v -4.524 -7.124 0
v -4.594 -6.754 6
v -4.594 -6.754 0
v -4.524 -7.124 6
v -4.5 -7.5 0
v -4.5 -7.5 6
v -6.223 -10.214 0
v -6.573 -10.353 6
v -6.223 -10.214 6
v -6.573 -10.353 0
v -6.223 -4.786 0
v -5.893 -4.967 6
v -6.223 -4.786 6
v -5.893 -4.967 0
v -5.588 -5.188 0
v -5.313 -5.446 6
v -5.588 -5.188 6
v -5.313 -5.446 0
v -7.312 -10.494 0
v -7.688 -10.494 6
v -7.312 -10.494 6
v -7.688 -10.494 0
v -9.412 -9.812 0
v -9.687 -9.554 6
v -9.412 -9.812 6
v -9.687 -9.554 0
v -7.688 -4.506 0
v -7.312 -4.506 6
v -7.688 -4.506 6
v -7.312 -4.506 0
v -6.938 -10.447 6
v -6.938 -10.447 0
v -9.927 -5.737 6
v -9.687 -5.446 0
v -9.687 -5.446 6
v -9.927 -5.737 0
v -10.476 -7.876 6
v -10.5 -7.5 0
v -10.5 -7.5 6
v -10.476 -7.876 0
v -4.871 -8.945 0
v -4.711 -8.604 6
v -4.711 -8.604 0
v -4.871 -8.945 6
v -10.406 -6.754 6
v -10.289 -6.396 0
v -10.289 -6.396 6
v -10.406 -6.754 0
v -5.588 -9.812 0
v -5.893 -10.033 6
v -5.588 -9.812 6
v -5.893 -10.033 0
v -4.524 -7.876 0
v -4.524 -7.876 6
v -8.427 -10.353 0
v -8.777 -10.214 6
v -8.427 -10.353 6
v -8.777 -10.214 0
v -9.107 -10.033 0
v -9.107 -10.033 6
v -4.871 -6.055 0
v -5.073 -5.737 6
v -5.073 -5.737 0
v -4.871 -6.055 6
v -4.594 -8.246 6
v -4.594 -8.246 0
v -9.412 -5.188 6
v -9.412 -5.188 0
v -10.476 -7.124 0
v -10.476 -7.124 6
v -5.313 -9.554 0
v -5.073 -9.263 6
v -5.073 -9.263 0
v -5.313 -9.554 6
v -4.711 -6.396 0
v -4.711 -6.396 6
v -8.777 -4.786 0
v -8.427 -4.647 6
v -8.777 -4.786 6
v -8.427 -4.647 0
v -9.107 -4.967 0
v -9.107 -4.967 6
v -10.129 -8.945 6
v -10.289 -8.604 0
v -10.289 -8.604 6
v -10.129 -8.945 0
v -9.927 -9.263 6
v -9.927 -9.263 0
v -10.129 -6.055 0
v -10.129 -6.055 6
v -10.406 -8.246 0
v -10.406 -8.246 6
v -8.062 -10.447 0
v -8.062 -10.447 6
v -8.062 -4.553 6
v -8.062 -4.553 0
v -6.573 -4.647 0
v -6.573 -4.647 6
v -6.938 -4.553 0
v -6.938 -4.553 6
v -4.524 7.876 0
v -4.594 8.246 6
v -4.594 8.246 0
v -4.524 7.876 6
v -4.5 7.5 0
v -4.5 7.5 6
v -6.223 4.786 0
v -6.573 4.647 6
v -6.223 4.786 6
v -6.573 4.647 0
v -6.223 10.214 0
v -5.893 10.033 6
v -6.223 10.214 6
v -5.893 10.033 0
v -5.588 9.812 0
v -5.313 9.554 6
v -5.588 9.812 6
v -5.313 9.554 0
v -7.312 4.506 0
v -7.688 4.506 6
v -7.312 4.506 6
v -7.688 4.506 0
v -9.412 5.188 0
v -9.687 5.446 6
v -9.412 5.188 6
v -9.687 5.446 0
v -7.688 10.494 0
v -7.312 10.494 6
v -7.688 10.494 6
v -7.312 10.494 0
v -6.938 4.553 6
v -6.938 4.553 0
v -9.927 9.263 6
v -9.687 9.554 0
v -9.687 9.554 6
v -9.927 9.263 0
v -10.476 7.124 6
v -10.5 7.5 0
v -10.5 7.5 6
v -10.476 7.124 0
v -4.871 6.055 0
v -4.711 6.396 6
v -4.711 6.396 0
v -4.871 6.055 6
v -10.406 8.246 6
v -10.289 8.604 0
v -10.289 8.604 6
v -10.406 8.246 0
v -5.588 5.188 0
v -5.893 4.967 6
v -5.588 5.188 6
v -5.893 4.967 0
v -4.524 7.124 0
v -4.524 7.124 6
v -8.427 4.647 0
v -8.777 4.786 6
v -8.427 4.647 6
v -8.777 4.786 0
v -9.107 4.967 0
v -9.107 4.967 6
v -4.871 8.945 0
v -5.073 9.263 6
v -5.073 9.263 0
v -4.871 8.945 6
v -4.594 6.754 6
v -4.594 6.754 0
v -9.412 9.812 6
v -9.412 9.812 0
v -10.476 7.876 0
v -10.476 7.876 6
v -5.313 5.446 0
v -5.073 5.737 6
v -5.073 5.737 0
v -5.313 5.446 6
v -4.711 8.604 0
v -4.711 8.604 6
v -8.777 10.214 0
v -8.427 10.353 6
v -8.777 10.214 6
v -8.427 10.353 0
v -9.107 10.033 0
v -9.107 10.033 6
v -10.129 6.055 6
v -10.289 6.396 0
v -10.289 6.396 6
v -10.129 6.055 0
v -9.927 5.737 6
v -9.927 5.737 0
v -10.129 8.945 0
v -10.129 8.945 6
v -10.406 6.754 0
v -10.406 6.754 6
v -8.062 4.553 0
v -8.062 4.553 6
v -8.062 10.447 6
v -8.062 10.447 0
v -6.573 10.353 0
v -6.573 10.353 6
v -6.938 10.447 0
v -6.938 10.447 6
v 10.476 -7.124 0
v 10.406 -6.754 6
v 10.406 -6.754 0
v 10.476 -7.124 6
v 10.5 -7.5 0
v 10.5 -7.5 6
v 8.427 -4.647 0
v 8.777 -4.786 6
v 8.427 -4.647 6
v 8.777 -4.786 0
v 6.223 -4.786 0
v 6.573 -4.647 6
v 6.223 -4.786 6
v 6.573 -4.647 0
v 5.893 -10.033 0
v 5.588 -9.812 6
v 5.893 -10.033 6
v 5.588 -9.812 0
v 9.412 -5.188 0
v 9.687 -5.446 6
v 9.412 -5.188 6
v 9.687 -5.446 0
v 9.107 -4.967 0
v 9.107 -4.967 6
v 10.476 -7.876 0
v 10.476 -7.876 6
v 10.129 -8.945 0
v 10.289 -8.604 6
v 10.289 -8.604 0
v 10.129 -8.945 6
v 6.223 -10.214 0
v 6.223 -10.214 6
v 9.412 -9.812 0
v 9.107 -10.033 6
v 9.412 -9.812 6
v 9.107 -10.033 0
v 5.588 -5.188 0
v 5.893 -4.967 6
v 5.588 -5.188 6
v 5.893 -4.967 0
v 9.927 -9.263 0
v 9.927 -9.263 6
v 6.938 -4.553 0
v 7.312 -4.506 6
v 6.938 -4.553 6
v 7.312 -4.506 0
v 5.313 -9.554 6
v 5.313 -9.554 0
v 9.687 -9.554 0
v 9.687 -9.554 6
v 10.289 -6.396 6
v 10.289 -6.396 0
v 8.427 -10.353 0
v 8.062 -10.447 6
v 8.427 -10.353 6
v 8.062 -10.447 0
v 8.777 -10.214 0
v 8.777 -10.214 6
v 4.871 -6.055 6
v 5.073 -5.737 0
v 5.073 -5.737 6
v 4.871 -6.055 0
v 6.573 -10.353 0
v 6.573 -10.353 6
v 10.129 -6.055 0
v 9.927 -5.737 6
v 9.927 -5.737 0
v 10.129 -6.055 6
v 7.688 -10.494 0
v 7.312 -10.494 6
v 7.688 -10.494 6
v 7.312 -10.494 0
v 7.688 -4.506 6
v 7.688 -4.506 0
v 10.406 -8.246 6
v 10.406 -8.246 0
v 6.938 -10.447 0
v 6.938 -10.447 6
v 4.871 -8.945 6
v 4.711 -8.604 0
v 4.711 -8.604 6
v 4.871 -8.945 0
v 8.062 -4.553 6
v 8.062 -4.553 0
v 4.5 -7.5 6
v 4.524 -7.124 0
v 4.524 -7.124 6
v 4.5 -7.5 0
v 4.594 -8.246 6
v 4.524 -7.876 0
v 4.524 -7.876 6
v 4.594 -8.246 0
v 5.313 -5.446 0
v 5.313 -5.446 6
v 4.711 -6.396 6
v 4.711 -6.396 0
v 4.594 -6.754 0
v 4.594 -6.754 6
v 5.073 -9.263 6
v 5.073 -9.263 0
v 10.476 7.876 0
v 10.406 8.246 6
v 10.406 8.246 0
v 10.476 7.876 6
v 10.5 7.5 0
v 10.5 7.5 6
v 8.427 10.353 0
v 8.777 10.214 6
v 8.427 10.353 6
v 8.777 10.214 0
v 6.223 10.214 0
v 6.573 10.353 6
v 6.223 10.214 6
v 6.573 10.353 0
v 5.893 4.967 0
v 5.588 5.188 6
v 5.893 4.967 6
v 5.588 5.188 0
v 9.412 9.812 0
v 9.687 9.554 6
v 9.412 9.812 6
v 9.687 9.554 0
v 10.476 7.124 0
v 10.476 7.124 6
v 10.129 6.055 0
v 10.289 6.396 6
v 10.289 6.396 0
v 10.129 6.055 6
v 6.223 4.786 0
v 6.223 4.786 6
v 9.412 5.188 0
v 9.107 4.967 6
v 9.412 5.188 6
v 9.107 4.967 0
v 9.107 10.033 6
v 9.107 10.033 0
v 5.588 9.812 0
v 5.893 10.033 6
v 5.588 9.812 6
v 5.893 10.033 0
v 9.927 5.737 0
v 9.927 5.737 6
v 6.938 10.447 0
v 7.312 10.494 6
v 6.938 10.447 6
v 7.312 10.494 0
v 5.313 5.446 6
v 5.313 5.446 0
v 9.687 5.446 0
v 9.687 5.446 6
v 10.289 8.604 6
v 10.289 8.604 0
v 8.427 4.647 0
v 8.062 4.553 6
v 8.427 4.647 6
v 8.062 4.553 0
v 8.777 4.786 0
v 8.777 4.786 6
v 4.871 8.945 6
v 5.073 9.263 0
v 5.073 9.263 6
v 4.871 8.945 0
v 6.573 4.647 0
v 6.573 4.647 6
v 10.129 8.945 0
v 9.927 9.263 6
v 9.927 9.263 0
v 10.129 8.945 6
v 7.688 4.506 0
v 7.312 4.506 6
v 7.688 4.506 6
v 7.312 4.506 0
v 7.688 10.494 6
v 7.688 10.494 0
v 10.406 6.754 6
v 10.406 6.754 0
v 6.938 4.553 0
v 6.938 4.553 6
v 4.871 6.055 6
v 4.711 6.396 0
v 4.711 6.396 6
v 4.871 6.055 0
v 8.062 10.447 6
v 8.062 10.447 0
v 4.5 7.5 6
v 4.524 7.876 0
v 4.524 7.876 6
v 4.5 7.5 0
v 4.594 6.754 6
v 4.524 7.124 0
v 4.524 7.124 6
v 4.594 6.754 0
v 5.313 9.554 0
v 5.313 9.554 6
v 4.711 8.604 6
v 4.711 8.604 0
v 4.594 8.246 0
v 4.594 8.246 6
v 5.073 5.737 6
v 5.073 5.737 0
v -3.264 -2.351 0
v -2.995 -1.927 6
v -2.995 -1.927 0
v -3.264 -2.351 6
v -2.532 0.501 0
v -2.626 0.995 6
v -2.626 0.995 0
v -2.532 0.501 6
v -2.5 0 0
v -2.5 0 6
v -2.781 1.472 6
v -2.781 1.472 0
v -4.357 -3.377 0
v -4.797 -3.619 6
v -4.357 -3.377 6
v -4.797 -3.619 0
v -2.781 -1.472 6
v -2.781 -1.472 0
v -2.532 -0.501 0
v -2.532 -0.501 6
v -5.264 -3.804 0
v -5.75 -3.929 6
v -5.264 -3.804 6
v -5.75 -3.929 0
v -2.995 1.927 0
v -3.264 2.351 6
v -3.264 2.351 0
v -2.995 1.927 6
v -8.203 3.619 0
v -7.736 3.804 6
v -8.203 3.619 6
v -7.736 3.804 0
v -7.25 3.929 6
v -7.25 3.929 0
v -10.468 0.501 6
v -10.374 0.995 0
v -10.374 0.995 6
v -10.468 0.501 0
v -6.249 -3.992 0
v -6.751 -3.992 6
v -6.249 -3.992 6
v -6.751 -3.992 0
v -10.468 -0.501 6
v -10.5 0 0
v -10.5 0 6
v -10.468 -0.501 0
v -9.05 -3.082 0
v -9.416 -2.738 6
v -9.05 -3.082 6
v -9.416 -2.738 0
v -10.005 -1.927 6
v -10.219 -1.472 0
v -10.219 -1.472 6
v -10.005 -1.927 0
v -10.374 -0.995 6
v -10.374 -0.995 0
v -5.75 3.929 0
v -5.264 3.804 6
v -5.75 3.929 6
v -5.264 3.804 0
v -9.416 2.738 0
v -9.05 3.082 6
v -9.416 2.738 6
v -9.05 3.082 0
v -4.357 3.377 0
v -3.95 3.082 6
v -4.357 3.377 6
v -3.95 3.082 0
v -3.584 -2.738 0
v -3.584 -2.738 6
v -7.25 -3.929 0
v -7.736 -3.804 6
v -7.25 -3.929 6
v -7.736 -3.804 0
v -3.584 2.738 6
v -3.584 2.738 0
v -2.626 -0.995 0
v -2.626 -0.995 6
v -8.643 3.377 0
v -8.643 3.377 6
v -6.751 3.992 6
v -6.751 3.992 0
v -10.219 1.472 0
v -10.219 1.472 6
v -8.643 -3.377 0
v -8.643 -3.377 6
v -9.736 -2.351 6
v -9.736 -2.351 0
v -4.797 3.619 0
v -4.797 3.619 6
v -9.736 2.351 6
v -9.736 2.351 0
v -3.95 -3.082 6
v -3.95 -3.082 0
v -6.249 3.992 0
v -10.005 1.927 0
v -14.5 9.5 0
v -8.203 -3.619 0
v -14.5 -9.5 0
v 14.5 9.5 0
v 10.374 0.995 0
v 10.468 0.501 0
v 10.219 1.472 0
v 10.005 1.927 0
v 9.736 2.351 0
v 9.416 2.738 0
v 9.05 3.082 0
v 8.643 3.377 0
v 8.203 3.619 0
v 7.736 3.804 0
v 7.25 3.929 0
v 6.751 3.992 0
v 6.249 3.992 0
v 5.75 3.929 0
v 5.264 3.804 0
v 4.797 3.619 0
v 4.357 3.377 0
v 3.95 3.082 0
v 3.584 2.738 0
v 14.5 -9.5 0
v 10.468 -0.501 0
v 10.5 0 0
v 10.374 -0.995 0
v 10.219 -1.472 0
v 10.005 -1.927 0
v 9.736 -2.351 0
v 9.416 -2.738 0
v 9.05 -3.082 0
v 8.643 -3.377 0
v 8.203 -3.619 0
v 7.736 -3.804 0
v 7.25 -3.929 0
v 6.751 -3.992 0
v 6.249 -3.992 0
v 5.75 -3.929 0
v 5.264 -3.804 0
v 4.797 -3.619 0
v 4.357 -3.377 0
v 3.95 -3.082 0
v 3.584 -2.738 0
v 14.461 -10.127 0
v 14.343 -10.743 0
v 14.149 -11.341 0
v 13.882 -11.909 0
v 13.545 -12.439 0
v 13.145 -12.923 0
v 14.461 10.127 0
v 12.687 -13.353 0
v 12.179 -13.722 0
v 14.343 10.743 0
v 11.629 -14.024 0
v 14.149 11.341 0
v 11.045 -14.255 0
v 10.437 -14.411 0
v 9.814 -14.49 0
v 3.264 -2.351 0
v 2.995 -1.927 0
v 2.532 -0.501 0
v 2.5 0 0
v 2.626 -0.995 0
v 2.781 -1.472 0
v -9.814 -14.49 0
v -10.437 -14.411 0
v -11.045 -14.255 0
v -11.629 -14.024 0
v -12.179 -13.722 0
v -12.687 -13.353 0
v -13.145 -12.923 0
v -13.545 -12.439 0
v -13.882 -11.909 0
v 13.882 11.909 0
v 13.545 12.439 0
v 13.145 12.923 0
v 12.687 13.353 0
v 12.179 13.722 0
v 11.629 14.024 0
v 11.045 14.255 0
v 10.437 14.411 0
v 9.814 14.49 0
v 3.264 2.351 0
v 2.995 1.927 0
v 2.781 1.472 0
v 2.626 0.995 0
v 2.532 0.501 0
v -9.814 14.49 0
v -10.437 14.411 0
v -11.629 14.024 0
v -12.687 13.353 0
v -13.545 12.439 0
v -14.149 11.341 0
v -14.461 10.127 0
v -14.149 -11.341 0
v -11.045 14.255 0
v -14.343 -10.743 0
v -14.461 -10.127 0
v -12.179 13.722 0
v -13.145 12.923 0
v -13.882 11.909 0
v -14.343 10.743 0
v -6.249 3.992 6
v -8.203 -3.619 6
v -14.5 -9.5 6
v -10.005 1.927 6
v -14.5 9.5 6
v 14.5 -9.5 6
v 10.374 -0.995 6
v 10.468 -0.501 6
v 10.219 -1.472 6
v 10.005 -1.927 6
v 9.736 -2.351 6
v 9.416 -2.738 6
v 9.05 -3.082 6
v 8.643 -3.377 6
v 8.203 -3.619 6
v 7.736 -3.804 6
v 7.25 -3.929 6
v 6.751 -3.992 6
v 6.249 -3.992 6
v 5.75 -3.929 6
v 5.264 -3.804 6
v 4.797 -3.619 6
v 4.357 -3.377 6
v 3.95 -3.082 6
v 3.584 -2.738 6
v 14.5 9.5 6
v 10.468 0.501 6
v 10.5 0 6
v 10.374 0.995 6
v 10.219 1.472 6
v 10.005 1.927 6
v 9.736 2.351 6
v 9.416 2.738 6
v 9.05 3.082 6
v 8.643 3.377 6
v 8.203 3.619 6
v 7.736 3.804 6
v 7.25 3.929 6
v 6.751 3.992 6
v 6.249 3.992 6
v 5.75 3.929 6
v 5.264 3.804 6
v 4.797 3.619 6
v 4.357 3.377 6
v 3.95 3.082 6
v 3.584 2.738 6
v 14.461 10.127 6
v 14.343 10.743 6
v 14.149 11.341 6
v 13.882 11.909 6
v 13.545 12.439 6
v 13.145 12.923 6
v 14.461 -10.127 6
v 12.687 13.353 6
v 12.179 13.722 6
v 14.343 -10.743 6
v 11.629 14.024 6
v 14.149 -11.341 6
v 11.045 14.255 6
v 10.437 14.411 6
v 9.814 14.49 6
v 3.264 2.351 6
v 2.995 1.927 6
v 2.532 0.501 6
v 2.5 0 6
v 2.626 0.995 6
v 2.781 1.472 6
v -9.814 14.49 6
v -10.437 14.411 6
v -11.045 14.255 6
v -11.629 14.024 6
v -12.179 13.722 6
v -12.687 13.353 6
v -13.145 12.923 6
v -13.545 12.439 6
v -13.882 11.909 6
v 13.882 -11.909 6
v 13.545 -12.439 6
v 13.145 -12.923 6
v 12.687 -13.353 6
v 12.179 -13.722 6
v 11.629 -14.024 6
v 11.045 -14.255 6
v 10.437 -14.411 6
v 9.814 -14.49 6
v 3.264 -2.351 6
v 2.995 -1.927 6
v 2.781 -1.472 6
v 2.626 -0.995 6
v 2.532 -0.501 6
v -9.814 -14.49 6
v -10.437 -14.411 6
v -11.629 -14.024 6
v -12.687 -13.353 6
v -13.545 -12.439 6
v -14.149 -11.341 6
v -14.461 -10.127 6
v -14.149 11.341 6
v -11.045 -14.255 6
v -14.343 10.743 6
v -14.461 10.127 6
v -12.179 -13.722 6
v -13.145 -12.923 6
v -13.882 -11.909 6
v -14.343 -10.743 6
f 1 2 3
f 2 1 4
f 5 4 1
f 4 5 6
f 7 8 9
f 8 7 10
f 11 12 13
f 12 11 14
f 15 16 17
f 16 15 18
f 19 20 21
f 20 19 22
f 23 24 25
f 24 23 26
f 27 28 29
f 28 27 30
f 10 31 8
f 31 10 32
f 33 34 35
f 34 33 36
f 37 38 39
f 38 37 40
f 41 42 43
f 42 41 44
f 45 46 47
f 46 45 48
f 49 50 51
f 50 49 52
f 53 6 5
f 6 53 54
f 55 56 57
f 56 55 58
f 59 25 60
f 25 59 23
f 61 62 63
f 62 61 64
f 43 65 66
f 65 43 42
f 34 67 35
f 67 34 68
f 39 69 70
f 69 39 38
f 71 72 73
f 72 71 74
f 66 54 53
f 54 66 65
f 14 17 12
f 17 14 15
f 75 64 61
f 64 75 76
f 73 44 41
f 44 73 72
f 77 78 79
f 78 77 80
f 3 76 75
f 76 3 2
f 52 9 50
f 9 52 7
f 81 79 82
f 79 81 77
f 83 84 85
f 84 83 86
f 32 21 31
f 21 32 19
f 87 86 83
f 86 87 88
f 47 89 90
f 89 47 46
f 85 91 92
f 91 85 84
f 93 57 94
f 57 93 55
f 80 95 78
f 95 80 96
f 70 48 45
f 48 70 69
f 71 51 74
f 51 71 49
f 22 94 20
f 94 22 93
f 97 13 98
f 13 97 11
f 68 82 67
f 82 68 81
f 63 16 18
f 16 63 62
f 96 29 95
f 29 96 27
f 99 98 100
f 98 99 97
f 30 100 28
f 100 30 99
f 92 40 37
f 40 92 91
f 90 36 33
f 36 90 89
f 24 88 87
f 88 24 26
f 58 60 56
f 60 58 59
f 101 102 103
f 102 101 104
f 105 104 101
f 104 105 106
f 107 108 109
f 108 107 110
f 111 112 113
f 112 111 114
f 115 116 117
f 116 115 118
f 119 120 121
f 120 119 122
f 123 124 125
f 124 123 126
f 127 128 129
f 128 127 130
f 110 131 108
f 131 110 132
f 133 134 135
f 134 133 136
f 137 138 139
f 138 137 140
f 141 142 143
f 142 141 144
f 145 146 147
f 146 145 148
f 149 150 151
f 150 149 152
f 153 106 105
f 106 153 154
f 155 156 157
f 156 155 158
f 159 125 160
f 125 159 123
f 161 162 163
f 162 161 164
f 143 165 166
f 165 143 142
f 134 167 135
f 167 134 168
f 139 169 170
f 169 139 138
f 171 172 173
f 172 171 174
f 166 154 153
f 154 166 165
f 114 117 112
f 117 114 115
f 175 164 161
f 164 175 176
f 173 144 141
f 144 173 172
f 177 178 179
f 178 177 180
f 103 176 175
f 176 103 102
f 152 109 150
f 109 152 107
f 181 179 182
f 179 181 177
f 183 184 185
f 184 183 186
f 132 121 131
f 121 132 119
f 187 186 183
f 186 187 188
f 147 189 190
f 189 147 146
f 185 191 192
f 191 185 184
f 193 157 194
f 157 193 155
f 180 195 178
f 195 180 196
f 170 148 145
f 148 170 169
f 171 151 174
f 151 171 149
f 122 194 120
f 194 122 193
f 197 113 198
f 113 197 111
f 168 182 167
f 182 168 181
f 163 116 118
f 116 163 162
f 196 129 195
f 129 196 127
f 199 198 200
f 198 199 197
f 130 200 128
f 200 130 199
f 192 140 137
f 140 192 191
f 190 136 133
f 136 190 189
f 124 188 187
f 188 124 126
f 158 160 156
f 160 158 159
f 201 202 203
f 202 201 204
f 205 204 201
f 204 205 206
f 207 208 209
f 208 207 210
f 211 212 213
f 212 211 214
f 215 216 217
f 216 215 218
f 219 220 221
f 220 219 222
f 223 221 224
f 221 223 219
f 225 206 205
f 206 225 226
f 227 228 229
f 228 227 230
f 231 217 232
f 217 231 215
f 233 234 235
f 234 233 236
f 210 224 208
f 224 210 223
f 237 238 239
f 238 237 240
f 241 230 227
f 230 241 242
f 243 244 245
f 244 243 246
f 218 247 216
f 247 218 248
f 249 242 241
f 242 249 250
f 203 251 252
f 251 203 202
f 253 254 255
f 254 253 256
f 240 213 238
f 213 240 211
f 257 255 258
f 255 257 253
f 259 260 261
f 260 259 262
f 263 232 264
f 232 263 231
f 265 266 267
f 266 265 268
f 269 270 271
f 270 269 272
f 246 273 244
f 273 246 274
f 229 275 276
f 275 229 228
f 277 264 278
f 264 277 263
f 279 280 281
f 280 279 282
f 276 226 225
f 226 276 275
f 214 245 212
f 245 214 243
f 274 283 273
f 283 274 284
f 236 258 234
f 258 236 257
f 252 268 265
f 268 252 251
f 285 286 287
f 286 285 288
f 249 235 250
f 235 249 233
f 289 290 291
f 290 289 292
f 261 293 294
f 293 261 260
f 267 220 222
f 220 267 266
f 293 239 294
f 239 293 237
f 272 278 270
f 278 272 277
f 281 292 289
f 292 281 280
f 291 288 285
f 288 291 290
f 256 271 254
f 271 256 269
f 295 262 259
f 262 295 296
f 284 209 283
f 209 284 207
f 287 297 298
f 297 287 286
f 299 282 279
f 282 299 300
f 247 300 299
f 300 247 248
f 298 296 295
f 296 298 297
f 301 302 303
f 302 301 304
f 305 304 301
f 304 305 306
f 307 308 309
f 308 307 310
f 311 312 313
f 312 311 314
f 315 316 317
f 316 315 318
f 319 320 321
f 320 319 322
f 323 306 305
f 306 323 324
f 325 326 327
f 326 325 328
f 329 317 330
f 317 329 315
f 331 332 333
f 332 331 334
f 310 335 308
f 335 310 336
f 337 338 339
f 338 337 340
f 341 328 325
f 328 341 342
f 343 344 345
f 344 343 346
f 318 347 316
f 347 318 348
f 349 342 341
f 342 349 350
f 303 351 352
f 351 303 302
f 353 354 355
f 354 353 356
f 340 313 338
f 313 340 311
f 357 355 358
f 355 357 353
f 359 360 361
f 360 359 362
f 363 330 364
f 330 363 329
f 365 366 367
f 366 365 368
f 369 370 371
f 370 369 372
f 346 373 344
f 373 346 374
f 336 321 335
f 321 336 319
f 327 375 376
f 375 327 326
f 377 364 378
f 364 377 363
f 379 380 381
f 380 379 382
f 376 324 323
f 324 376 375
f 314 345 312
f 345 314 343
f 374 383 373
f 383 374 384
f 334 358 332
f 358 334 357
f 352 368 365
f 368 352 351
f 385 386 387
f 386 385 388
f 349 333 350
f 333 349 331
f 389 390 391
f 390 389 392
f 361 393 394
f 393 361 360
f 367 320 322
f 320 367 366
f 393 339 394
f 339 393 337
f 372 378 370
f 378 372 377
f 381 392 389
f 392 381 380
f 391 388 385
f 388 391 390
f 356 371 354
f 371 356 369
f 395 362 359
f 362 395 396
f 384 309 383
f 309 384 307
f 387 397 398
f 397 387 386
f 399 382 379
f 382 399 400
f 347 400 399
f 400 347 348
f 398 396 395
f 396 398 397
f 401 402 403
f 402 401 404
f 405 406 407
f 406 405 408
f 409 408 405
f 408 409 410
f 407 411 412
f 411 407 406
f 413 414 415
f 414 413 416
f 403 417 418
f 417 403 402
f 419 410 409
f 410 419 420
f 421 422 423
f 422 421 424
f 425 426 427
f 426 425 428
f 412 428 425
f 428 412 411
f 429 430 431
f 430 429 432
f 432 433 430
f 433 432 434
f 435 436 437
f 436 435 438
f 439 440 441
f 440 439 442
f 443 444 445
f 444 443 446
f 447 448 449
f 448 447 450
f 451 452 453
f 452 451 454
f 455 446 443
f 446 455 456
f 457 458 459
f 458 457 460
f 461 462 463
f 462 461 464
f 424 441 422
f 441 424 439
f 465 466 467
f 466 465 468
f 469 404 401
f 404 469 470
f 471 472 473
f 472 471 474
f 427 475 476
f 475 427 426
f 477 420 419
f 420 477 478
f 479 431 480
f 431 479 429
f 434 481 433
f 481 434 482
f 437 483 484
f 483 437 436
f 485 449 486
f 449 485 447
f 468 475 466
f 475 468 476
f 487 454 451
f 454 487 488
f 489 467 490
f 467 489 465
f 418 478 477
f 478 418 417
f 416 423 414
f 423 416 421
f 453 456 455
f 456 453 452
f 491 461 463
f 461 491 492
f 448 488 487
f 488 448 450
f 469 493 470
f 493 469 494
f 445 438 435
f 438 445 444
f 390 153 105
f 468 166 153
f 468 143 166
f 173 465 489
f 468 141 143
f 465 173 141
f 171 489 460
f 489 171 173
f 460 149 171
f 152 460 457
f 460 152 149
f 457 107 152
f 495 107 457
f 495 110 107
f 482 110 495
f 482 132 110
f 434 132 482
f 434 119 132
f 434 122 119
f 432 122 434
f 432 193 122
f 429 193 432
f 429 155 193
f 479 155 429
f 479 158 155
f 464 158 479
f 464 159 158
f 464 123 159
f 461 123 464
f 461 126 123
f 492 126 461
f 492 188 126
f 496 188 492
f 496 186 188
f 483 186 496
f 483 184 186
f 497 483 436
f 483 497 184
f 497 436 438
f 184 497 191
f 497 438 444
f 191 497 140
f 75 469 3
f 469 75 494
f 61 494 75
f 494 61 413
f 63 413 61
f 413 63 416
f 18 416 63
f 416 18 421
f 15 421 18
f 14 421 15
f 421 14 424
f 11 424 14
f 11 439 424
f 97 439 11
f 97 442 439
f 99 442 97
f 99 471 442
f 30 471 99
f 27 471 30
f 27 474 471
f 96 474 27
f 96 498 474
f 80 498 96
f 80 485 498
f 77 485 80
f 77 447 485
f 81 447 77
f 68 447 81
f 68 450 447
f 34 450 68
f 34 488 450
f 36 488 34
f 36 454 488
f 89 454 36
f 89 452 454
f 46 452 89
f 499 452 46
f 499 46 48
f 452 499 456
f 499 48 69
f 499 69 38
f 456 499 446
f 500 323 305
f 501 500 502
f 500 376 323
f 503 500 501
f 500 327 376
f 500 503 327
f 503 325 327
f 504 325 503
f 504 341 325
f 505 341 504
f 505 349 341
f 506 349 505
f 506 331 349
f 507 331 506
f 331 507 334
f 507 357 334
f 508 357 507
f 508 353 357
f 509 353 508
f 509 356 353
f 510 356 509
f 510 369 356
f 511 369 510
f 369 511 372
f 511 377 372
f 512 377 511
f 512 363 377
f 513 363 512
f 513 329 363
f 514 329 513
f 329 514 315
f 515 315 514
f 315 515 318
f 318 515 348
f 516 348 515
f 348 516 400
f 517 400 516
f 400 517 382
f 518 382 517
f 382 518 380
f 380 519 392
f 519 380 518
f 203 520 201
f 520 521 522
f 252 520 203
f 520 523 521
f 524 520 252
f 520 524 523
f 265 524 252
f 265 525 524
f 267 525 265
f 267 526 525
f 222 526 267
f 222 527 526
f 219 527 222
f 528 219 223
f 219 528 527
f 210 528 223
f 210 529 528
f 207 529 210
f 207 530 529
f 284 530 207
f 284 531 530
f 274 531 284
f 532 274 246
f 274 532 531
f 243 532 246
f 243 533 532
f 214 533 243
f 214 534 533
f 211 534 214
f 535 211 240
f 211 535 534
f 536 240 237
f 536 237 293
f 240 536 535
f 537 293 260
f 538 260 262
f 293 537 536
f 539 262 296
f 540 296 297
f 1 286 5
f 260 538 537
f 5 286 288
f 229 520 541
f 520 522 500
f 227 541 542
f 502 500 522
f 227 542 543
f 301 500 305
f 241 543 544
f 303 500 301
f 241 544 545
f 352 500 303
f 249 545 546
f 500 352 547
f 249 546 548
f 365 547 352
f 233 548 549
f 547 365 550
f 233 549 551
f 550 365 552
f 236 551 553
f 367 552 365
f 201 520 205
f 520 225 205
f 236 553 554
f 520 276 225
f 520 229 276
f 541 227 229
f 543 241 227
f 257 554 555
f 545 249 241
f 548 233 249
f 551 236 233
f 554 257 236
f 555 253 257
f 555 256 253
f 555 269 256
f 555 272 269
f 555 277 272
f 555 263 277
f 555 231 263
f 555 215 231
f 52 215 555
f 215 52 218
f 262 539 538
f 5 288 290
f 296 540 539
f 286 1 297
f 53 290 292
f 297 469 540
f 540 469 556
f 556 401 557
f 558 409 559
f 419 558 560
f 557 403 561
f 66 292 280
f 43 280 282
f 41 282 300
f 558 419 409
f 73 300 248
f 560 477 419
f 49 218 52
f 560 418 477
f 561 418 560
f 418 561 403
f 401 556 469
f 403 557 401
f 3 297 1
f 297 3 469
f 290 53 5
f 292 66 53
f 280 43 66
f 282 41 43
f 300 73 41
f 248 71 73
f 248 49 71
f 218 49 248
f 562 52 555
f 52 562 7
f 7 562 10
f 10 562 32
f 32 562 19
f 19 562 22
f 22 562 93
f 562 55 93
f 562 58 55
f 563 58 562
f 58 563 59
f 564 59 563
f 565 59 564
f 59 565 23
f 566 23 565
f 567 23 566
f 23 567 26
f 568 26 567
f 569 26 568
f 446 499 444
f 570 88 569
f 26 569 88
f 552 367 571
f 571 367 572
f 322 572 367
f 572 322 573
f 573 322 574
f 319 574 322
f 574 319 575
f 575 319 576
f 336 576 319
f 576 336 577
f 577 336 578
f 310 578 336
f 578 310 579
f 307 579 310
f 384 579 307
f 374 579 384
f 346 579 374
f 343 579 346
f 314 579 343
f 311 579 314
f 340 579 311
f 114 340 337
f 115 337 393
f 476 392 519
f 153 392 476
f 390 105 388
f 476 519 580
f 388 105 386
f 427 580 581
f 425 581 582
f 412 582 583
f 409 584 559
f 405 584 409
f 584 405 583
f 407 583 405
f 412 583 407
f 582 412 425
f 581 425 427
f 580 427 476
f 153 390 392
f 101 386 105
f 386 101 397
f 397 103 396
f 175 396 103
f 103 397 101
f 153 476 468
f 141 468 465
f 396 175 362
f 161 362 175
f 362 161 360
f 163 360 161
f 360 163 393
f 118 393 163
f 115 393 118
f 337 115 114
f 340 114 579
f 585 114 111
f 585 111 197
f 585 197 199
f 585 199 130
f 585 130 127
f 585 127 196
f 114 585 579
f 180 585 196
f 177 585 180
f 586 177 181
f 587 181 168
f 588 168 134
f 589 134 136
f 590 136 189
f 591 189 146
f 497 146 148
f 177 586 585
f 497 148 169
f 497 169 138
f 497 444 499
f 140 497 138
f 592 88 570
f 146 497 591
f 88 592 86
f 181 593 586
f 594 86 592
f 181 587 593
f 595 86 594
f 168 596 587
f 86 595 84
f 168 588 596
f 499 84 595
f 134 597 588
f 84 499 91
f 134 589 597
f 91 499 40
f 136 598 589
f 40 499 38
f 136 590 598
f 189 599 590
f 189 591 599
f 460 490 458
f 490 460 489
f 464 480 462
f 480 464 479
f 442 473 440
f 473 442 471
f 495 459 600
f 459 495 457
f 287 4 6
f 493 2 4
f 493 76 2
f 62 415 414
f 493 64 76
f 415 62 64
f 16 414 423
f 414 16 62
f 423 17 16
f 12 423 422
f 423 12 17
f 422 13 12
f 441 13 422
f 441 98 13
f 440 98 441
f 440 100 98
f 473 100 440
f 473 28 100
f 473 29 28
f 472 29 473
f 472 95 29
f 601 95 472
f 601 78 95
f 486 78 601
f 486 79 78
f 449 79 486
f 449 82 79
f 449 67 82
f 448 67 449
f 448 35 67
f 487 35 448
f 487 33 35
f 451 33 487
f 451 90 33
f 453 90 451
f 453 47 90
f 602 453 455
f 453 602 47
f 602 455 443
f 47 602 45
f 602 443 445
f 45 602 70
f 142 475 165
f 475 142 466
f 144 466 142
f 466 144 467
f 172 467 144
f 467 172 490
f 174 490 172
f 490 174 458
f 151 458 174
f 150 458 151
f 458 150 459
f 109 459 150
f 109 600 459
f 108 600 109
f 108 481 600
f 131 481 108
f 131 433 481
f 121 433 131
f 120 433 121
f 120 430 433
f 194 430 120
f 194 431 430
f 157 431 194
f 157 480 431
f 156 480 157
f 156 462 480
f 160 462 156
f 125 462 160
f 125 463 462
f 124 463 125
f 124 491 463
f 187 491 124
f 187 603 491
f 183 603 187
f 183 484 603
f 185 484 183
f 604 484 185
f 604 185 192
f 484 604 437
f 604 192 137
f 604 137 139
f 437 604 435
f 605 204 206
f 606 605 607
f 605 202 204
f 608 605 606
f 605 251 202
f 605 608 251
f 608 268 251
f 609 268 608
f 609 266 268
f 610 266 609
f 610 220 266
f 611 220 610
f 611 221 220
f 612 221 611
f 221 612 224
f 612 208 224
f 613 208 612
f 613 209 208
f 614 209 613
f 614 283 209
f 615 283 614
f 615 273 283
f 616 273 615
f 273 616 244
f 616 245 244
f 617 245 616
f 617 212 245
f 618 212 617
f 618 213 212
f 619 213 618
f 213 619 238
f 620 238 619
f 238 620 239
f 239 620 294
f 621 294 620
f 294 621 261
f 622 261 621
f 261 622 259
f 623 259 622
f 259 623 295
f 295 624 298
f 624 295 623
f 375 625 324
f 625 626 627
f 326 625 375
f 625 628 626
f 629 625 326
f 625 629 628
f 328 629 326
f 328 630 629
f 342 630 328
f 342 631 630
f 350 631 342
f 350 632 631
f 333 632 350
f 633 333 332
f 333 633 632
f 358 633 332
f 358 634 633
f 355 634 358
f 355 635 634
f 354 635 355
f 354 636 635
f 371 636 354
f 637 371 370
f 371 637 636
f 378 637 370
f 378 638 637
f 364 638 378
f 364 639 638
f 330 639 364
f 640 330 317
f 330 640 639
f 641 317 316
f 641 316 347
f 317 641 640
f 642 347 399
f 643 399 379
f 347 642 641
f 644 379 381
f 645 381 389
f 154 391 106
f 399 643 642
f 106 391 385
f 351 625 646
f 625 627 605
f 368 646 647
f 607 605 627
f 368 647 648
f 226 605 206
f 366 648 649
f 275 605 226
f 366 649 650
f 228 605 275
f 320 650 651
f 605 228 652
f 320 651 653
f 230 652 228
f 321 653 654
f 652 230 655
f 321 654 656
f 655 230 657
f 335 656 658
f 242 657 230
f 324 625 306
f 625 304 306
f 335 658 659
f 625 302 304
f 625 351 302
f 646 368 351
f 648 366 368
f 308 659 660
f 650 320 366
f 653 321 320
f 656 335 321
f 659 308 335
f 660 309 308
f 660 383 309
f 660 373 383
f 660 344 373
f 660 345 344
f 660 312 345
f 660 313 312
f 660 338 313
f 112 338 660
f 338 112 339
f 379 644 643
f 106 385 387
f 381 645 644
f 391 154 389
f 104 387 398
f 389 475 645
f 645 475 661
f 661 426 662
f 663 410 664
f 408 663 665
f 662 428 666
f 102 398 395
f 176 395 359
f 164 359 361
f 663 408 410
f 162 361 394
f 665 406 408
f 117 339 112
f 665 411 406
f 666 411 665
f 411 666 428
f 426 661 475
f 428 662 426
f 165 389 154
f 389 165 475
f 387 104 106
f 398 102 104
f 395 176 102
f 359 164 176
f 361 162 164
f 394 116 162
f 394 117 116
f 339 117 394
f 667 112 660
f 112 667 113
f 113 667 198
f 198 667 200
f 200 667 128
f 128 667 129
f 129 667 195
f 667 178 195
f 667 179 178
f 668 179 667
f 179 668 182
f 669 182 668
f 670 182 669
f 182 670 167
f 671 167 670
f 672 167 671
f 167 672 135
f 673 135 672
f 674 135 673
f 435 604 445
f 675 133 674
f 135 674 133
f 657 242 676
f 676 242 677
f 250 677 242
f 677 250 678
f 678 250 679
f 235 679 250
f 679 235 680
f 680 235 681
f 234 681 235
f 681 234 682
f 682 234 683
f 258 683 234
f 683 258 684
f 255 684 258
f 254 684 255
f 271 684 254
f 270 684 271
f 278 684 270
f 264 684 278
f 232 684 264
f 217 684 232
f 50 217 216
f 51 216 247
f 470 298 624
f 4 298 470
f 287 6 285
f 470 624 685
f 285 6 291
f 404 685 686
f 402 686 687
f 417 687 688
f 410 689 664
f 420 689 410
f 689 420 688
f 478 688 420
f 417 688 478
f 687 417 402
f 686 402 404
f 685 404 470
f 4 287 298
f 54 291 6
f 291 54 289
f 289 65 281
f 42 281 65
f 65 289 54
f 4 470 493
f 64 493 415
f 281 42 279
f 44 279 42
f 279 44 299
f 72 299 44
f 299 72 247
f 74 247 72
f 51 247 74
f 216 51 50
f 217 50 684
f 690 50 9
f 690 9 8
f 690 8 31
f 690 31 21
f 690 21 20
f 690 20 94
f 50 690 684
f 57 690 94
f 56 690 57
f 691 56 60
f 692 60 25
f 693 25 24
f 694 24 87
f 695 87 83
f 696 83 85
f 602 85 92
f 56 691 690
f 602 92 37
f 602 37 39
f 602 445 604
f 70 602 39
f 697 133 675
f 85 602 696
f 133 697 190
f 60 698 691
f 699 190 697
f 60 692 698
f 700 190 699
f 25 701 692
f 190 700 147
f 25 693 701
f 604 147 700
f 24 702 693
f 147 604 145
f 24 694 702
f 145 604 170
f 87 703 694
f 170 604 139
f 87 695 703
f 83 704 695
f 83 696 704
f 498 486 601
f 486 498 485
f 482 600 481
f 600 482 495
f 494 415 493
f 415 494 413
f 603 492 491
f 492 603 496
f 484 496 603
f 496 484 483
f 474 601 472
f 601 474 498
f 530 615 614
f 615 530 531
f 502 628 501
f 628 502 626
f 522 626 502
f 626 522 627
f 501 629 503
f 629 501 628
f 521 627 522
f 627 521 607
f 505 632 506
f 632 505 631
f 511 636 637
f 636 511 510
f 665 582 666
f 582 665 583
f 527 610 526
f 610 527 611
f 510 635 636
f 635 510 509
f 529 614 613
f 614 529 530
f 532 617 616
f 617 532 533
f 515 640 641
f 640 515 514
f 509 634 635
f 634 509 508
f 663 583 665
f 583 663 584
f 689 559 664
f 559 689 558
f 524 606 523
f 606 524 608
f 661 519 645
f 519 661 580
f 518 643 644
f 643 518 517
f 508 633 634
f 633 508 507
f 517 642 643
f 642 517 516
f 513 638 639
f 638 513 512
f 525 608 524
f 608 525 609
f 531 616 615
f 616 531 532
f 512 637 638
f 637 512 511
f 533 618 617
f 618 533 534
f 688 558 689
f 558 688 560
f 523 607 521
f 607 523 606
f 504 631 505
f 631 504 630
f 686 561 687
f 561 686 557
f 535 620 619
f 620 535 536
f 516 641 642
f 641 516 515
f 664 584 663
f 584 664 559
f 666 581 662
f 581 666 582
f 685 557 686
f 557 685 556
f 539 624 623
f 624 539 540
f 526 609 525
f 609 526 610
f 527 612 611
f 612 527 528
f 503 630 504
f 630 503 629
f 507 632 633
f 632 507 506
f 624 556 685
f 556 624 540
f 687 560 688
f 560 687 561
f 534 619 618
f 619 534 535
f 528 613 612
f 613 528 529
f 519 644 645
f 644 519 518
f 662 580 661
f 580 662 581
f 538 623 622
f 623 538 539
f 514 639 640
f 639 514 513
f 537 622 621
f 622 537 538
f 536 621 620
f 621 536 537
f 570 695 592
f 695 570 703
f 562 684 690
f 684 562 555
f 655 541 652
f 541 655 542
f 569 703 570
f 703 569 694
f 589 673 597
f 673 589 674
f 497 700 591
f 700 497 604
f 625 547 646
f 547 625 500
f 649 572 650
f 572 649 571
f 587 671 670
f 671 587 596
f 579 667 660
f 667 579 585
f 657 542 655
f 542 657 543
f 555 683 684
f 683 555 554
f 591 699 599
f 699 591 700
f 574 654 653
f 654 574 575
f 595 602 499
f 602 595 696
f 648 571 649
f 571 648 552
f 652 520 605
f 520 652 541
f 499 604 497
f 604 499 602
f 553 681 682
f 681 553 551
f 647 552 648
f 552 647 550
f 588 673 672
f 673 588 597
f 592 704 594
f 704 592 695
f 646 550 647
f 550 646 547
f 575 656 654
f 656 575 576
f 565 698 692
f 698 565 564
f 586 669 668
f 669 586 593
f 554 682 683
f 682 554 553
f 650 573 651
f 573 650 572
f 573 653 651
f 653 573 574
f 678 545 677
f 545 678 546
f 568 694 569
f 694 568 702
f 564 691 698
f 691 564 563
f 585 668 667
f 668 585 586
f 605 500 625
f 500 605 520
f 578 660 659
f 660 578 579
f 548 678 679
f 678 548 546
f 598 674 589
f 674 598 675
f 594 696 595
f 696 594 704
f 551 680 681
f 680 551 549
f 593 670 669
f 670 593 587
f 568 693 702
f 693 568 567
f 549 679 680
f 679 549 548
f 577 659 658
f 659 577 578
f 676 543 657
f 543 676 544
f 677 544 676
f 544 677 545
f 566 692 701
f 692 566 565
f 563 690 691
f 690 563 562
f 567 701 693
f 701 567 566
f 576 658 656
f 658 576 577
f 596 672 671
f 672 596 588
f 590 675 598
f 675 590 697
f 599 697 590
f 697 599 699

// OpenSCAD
$fn = 50;


difference() {
	union() {
		hull() {
			translate(v = [-9.5000000000, 9.5000000000, 0]) {
				cylinder(h = 6, r = 5);
			}
			translate(v = [9.5000000000, 9.5000000000, 0]) {
				cylinder(h = 6, r = 5);
			}
			translate(v = [-9.5000000000, -9.5000000000, 0]) {
				cylinder(h = 6, r = 5);
			}
			translate(v = [9.5000000000, -9.5000000000, 0]) {
				cylinder(h = 6, r = 5);
			}
		}
	}
	union() {
		#translate(v = [-7.5000000000, -7.5000000000, -100.0000000000]) {
			cylinder(h = 200, r = 3.0000000000);
		}
		#translate(v = [-7.5000000000, 7.5000000000, -100.0000000000]) {
			cylinder(h = 200, r = 3.0000000000);
		}
		#translate(v = [7.5000000000, -7.5000000000, -100.0000000000]) {
			cylinder(h = 200, r = 3.0000000000);
		}
		#translate(v = [7.5000000000, 7.5000000000, -100.0000000000]) {
			cylinder(h = 200, r = 3.0000000000);
		}
		#translate(v = [-6.5000000000, 0, 0]) {
			cylinder(h = 6, r = 4.0000000000);
		}
		#translate(v = [6.5000000000, 0, 0]) {
			cylinder(h = 6, r = 4.0000000000);
		}
	}
}
